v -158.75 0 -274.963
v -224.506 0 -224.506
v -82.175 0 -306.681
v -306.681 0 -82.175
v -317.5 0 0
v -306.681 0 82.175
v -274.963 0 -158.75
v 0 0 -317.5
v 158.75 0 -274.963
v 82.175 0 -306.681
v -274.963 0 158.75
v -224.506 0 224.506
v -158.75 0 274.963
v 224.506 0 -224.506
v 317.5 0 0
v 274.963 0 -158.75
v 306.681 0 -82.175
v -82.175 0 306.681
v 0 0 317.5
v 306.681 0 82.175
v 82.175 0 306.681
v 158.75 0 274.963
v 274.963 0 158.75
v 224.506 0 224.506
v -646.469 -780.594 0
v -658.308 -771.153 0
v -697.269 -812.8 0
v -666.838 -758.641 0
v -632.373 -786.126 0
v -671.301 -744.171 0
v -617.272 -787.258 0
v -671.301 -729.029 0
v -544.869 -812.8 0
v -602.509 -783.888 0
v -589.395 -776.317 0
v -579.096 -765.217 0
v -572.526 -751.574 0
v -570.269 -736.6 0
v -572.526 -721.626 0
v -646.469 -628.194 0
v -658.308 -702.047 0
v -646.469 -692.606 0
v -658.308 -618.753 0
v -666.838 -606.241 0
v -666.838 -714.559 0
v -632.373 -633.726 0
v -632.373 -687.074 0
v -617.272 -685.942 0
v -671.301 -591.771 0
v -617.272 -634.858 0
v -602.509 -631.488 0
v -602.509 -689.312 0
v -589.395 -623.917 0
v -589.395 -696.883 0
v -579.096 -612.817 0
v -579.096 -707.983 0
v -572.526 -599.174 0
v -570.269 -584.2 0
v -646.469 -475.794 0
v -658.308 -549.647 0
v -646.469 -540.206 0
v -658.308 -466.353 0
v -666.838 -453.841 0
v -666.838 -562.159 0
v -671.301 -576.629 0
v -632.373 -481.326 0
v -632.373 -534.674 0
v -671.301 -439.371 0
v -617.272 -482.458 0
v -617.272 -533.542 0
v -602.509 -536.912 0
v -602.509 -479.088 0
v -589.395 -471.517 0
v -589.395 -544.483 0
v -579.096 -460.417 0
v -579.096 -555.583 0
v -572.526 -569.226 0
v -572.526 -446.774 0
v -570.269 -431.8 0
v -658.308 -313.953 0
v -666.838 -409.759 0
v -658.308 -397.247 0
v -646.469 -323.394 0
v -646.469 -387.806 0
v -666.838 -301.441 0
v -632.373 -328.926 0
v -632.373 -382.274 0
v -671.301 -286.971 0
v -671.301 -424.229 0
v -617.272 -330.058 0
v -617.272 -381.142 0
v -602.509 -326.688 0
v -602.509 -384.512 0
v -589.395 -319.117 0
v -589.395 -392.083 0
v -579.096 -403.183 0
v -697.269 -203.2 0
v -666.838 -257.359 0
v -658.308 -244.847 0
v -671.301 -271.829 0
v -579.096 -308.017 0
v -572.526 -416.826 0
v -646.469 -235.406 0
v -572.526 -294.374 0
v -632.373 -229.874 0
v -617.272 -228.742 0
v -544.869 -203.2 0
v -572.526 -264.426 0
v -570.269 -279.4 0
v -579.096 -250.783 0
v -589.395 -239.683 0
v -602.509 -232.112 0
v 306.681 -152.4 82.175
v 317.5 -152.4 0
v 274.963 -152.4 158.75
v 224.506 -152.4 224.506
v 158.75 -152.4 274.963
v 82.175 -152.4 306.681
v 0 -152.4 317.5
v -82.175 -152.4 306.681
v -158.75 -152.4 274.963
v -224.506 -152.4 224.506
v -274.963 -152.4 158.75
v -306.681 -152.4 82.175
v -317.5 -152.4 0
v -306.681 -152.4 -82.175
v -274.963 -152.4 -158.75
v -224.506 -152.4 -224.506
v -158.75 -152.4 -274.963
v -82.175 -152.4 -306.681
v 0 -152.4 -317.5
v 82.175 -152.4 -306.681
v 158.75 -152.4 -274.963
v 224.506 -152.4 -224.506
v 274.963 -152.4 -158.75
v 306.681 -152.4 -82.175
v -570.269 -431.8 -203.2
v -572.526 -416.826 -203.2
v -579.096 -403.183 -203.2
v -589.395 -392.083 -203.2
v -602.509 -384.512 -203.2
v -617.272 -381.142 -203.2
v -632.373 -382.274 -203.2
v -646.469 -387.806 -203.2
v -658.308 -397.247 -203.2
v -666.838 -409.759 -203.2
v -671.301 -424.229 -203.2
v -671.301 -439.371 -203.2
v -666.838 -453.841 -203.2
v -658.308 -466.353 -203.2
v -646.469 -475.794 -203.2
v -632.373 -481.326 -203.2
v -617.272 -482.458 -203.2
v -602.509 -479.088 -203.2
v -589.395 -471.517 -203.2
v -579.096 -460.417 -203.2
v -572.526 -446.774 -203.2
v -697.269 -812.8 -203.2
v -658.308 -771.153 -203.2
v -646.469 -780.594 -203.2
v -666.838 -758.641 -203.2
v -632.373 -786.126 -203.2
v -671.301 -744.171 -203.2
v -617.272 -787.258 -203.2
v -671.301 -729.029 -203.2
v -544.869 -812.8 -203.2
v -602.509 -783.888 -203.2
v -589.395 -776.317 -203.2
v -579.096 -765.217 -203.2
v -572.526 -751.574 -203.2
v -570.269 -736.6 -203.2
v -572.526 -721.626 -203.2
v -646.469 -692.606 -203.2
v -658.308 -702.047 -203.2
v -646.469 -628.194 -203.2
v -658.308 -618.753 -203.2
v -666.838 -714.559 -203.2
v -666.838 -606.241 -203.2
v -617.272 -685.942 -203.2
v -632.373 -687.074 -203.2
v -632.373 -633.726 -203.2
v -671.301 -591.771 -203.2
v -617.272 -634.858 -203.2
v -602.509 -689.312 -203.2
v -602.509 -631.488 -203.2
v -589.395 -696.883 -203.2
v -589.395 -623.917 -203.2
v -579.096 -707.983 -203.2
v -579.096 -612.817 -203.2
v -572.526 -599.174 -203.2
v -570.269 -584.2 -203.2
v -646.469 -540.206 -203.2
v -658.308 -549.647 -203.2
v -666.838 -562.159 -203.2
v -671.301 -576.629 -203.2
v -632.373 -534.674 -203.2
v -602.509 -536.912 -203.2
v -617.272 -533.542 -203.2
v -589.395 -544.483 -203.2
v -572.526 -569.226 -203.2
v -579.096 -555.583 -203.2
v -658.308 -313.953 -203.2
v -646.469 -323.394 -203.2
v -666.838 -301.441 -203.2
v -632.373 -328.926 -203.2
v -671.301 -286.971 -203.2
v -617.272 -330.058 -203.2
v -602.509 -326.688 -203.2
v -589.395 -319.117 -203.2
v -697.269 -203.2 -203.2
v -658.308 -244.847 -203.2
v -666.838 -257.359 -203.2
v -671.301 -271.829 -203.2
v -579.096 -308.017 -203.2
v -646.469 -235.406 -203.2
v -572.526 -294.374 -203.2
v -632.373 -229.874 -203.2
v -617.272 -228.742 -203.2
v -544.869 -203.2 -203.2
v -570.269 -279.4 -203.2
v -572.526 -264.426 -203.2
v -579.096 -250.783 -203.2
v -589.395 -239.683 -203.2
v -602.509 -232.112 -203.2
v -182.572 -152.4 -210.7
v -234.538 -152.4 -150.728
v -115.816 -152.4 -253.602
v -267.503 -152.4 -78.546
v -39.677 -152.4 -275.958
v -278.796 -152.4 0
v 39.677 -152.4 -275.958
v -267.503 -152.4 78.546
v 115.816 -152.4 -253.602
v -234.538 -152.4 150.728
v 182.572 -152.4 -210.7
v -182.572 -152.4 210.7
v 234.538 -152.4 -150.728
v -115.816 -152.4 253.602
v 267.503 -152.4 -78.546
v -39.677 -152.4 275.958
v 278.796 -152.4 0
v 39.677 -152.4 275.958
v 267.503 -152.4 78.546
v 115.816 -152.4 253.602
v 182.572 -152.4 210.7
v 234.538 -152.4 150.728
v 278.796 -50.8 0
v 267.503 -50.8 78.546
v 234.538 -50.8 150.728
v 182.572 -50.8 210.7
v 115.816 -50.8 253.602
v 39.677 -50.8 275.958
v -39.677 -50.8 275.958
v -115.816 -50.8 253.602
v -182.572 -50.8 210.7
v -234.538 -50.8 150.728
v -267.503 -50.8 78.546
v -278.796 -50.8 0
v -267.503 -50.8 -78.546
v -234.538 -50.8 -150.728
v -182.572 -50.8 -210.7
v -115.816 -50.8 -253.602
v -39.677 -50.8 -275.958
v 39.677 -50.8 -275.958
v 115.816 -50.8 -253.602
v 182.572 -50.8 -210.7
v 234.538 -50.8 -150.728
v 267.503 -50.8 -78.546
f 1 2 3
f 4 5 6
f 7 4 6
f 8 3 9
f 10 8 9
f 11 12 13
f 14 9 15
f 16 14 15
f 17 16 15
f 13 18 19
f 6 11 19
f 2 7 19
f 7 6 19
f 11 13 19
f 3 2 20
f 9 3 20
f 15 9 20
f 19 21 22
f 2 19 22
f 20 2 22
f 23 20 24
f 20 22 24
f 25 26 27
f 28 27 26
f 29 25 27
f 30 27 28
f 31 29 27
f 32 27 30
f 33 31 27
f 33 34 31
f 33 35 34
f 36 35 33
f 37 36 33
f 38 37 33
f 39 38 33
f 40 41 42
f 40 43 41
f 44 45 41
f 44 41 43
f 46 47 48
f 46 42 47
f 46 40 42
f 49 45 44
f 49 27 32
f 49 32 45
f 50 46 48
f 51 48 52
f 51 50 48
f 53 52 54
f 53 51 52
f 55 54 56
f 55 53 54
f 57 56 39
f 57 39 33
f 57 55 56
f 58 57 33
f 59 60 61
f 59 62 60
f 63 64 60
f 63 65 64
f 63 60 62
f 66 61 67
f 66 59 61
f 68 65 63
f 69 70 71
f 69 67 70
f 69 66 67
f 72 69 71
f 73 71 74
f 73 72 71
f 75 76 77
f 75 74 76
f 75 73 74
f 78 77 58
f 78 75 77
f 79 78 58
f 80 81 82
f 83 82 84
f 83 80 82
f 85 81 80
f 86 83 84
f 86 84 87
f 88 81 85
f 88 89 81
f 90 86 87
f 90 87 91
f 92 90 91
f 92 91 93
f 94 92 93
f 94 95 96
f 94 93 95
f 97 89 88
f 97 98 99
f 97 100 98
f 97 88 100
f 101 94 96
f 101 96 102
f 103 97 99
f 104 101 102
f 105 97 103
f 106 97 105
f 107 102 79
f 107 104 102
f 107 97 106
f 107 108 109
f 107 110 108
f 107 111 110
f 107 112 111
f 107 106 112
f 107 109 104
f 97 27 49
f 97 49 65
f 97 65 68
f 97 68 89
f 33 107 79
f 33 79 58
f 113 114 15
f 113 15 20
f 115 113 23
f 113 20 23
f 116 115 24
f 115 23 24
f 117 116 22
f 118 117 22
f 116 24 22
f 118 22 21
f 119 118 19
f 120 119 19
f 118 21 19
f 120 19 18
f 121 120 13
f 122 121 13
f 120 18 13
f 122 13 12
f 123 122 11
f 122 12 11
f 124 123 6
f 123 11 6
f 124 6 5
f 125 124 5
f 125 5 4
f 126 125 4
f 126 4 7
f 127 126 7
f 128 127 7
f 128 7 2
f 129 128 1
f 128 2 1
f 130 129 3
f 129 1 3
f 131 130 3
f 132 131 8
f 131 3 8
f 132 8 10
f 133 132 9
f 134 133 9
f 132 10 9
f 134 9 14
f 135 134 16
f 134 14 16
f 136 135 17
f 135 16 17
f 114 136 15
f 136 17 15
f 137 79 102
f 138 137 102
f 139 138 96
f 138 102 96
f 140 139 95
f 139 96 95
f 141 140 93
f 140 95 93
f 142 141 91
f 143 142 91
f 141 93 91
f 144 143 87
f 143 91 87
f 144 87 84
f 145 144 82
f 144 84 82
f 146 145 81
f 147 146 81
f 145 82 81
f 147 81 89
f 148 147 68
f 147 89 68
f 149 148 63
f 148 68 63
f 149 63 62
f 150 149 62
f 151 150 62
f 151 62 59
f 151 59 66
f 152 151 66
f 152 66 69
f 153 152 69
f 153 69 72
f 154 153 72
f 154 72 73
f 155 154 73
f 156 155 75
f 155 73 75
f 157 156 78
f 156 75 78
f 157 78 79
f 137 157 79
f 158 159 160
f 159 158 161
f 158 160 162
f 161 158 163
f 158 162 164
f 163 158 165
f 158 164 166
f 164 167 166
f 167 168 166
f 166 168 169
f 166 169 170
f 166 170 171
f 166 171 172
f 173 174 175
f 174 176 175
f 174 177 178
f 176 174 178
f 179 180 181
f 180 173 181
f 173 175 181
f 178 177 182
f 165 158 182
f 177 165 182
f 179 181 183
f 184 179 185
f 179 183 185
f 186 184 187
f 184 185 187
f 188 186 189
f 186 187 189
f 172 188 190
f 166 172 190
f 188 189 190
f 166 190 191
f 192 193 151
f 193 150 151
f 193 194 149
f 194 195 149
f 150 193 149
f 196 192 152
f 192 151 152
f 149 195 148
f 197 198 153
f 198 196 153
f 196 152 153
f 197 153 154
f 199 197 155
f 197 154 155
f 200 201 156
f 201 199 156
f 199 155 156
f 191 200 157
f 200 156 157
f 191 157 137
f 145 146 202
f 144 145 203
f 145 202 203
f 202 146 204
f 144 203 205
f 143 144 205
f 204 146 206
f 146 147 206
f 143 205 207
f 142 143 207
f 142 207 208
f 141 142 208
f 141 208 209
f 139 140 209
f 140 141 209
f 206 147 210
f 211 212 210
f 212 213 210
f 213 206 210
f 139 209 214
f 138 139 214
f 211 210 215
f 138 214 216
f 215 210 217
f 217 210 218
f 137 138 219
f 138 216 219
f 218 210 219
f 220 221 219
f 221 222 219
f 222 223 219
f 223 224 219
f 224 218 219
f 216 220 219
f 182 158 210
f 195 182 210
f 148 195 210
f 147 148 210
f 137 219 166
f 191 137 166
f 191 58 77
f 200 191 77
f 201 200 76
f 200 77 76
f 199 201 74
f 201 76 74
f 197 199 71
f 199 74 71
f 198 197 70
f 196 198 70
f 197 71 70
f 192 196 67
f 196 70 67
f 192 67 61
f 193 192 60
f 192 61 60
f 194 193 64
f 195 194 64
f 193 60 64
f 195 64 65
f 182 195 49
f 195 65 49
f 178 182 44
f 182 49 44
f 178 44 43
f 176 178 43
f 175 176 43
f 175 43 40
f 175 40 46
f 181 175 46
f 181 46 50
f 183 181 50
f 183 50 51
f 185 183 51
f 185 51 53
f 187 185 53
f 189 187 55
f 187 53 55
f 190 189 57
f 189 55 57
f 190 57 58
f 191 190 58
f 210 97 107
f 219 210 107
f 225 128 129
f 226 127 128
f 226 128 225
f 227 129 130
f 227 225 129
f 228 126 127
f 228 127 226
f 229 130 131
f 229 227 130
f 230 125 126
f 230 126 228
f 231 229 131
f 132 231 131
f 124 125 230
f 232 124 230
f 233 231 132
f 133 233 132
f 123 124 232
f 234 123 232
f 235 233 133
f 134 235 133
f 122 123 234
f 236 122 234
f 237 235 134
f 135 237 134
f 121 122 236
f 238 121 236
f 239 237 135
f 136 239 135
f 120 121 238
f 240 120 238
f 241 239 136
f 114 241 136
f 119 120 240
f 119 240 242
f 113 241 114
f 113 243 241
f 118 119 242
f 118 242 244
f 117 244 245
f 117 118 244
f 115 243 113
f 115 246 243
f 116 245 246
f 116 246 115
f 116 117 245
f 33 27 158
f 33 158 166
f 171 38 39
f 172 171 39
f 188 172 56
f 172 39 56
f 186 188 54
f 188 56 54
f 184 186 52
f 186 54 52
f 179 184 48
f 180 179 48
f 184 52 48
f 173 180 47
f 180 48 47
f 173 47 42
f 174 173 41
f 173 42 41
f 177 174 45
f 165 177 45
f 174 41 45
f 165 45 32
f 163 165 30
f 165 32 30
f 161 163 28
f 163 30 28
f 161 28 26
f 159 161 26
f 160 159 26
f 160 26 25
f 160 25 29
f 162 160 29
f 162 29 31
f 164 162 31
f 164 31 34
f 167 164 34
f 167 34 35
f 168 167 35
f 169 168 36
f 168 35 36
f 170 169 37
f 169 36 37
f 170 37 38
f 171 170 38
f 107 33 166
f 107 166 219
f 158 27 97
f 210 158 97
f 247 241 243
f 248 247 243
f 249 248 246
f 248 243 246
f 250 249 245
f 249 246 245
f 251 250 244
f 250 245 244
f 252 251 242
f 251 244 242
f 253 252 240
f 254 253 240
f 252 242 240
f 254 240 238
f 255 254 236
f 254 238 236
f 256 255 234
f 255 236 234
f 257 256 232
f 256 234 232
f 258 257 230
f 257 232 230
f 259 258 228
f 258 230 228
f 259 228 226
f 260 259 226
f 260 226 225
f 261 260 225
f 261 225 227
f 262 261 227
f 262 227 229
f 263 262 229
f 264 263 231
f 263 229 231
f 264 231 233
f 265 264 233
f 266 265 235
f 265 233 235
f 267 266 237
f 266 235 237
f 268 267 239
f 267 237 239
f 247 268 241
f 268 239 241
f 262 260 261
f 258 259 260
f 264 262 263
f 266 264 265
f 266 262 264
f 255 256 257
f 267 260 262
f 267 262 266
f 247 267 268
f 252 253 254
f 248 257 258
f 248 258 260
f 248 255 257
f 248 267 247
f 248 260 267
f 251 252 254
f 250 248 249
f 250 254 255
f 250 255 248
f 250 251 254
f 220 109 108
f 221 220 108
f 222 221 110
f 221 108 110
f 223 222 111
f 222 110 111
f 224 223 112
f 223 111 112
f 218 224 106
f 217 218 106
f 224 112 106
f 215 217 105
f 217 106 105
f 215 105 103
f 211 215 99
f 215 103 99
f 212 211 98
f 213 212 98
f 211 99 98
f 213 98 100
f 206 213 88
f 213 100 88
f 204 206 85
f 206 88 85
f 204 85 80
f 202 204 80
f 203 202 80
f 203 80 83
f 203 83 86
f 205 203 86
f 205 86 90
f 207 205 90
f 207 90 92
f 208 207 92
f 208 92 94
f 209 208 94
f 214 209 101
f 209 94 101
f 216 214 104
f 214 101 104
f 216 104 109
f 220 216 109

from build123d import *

# Parameters (mm, degrees)
F0_R     = 317.5
F1_DEPTH = 152.4
F2_W     = 152.4
F2_H     = 609.6
F2_R     = 50.8
F3_DEPTH = 203.2
F4_R     = 278.795744
F5_DEPTH = 101.6


with BuildPart() as f1:
    # F0 (on Front) → F1 (new body)
    with BuildSketch(Plane.XZ):
        Circle(F0_R)
    extrude(amount=F1_DEPTH)

    # F4 (on face) → F5 (cut)
    with BuildSketch(Plane.XZ.offset(152.4)):
        Circle(F4_R)
    extrude(amount=-F5_DEPTH, mode=Mode.SUBTRACT)


with BuildPart() as f3:
    # F2 (on Top) → F3 (new body)
    with BuildSketch(Plane.XY):
        with Locations((-621.068776, -508)):
            Rectangle(F2_W, F2_H)
        with Locations((-621.068776, -736.6)):
            Circle(F2_R, mode=Mode.SUBTRACT)
        with Locations((-621.068776, -584.2)):
            Circle(F2_R, mode=Mode.SUBTRACT)
        with Locations((-621.068776, -431.8)):
            Circle(F2_R, mode=Mode.SUBTRACT)
        with Locations((-621.068776, -279.4)):
            Circle(F2_R, mode=Mode.SUBTRACT)
    extrude(amount=-F3_DEPTH)


solid = Compound([f1.part, f3.part])
